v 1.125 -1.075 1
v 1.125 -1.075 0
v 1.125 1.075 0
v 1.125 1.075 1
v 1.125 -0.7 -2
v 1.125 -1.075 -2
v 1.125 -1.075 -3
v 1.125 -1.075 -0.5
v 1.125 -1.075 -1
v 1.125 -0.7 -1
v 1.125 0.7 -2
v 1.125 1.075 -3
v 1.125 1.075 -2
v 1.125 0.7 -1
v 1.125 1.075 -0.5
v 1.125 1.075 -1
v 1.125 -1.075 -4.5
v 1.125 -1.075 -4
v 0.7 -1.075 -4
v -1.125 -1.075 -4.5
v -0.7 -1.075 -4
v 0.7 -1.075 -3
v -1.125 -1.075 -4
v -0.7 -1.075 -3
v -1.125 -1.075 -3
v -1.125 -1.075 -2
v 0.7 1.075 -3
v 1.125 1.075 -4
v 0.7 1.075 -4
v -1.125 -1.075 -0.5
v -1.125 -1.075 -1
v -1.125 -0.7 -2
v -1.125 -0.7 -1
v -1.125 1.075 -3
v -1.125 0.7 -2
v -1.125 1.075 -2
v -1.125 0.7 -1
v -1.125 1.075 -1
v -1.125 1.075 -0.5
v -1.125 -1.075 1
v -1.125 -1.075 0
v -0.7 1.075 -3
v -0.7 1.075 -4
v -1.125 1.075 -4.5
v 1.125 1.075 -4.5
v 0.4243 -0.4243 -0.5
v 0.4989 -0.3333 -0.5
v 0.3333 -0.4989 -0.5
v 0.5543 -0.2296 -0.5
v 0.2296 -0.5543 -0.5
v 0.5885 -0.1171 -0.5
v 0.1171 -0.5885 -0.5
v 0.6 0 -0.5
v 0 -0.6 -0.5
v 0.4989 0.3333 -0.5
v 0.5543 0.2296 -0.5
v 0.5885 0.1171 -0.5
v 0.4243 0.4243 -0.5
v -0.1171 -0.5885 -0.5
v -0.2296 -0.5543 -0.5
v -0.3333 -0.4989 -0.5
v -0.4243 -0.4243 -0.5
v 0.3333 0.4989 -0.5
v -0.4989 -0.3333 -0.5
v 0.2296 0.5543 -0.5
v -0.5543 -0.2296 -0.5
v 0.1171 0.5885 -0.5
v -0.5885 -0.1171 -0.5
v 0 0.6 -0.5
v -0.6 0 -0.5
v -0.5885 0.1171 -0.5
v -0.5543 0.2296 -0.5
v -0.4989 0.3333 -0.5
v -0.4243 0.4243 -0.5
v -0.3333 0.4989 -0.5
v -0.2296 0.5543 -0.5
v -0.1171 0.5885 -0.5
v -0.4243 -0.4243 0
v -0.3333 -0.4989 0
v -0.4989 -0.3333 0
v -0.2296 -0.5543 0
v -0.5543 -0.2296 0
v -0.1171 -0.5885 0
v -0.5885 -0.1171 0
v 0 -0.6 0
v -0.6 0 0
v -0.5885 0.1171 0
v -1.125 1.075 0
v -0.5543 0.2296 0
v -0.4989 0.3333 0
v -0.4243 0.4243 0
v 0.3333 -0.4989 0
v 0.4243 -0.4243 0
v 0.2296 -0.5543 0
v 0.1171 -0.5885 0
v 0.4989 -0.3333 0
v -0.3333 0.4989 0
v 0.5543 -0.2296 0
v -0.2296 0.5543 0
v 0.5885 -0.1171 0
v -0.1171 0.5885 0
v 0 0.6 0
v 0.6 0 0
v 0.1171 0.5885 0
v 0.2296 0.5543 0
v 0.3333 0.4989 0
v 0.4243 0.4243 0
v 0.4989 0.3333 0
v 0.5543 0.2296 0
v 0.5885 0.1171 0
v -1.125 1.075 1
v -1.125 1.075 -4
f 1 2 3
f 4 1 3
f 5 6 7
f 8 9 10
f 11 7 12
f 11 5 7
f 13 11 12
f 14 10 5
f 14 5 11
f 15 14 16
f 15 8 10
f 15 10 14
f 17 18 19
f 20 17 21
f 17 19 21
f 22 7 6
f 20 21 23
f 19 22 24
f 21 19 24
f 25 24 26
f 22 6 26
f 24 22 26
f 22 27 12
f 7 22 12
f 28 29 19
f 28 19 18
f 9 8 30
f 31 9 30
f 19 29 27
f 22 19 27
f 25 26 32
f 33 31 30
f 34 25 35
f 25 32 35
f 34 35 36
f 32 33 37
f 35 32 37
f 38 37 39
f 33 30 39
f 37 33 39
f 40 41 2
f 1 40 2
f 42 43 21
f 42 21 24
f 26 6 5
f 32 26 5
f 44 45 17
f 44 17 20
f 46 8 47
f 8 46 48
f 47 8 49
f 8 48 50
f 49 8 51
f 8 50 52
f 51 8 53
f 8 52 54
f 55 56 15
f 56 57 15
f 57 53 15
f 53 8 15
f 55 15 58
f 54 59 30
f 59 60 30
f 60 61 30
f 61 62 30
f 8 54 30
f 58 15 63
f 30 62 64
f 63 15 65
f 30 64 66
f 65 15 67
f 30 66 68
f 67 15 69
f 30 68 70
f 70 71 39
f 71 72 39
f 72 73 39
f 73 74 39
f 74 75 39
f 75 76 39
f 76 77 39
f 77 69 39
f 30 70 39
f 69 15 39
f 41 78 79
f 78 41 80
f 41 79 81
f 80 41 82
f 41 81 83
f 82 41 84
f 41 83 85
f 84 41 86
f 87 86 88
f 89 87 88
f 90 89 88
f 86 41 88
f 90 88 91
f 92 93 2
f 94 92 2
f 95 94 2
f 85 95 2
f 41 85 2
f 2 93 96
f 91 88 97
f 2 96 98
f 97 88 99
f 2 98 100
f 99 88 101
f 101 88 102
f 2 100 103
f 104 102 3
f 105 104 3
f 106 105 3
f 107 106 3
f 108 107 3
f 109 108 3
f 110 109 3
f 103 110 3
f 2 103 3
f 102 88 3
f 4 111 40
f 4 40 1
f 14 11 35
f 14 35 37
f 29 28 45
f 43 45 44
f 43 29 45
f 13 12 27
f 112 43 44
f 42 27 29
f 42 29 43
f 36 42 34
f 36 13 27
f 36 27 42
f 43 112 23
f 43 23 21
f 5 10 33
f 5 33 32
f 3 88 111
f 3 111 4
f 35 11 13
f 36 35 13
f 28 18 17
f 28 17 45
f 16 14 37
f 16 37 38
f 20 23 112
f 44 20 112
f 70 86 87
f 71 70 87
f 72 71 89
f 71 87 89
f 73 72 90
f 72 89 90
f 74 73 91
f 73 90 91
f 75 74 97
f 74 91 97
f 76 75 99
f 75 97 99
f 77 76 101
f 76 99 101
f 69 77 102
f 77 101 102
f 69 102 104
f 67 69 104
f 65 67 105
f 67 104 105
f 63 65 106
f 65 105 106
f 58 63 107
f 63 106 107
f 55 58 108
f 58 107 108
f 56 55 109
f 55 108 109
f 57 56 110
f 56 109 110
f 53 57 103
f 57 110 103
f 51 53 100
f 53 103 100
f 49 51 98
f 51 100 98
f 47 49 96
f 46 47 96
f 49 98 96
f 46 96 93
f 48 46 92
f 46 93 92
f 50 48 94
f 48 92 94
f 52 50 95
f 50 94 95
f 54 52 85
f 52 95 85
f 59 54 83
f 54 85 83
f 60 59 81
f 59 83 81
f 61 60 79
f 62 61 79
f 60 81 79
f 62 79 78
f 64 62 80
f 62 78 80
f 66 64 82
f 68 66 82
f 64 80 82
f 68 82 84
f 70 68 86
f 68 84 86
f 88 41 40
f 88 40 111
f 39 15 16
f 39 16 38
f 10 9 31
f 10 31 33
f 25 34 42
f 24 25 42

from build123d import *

# Parameters (mm, degrees)
SKETCH_2_W               = 2.25
SKETCH_2_H               = 2.15
EXTRUDE_4_DEPTH          = 1
SKETCH_4_R               = 0.6
EXTRUDE_5_DEPTH          = 0.5
SKETCH_5_W               = 2.25
SKETCH_5_H               = 2.15
EXTRUDE_6_DEPTH          = 2
CUT_EXTRUDE_1_DEPTH      = 4.531023223
CUT_EXTRUDE_1_DEPTH_BACK = 4.531023223
SKETCH_6_W               = 0.5
SKETCH_6_H               = 0.375
SKETCH_7_W               = 2.25
SKETCH_7_H               = 2.15
EXTRUDE_7_DEPTH          = 2
CUT_EXTRUDE_2_DEPTH      = 6.112545843
CUT_EXTRUDE_2_DEPTH_BACK = 6.112545843
SKETCH_9_W               = 0.425
SKETCH_9_H               = 1


with BuildPart() as part:
    # 草图2 → 凸台-拉伸4 (new body)
    with BuildSketch(Plane.XY):
        Rectangle(SKETCH_2_W, SKETCH_2_H)
    extrude(amount=EXTRUDE_4_DEPTH)

    # 草图4 → 凸台-拉伸5 (add)
    with BuildSketch(Plane(origin=(0, 0, 0), x_dir=(-1, 0, 0), z_dir=(0, 0, -1))):
        Circle(SKETCH_4_R)
    extrude(amount=EXTRUDE_5_DEPTH)

    # 草图5 → 凸台-拉伸6 (add)
    with BuildSketch(Plane(origin=(0, 0, -0.5), x_dir=(-1, 0, 0), z_dir=(0, 0, -1))):
        Rectangle(SKETCH_5_W, SKETCH_5_H)
    extrude(amount=EXTRUDE_6_DEPTH)

    # 草图6 → 切除-拉伸1 (cut, two sides: drawn at the far end of the back side and taken through both)
    with BuildSketch(Plane.ZY.offset(1.125).offset(-CUT_EXTRUDE_1_DEPTH_BACK)):
        with Locations((-1.75, -0.8875)):
            Rectangle(SKETCH_6_W, SKETCH_6_H)
        with Locations((-1.25, -0.8875)):
            Rectangle(SKETCH_6_W, SKETCH_6_H)
        with Locations((-1.75, 0.8875)):
            Rectangle(SKETCH_6_W, SKETCH_6_H)
        with Locations((-1.25, 0.8875)):
            Rectangle(SKETCH_6_W, SKETCH_6_H)
    extrude(amount=CUT_EXTRUDE_1_DEPTH + CUT_EXTRUDE_1_DEPTH_BACK, mode=Mode.SUBTRACT)

    # 草图7 → 凸台-拉伸7 (add)
    with BuildSketch(Plane(origin=(0, 0, -2.5), x_dir=(-1, 0, 0), z_dir=(0, 0, -1))):
        Rectangle(SKETCH_7_W, SKETCH_7_H)
    extrude(amount=EXTRUDE_7_DEPTH)

    # 草图9 → 切除-拉伸2 (cut, two sides: drawn at the far end of the back side and taken through both)
    with BuildSketch(Plane.XZ.offset(1.075).offset(-CUT_EXTRUDE_2_DEPTH_BACK)):
        with Locations((-0.9125, -3.5)):
            Rectangle(SKETCH_9_W, SKETCH_9_H)
        with Locations((0.9125, -3.5)):
            Rectangle(SKETCH_9_W, SKETCH_9_H)
    extrude(amount=CUT_EXTRUDE_2_DEPTH + CUT_EXTRUDE_2_DEPTH_BACK, mode=Mode.SUBTRACT)


solid = part.part
